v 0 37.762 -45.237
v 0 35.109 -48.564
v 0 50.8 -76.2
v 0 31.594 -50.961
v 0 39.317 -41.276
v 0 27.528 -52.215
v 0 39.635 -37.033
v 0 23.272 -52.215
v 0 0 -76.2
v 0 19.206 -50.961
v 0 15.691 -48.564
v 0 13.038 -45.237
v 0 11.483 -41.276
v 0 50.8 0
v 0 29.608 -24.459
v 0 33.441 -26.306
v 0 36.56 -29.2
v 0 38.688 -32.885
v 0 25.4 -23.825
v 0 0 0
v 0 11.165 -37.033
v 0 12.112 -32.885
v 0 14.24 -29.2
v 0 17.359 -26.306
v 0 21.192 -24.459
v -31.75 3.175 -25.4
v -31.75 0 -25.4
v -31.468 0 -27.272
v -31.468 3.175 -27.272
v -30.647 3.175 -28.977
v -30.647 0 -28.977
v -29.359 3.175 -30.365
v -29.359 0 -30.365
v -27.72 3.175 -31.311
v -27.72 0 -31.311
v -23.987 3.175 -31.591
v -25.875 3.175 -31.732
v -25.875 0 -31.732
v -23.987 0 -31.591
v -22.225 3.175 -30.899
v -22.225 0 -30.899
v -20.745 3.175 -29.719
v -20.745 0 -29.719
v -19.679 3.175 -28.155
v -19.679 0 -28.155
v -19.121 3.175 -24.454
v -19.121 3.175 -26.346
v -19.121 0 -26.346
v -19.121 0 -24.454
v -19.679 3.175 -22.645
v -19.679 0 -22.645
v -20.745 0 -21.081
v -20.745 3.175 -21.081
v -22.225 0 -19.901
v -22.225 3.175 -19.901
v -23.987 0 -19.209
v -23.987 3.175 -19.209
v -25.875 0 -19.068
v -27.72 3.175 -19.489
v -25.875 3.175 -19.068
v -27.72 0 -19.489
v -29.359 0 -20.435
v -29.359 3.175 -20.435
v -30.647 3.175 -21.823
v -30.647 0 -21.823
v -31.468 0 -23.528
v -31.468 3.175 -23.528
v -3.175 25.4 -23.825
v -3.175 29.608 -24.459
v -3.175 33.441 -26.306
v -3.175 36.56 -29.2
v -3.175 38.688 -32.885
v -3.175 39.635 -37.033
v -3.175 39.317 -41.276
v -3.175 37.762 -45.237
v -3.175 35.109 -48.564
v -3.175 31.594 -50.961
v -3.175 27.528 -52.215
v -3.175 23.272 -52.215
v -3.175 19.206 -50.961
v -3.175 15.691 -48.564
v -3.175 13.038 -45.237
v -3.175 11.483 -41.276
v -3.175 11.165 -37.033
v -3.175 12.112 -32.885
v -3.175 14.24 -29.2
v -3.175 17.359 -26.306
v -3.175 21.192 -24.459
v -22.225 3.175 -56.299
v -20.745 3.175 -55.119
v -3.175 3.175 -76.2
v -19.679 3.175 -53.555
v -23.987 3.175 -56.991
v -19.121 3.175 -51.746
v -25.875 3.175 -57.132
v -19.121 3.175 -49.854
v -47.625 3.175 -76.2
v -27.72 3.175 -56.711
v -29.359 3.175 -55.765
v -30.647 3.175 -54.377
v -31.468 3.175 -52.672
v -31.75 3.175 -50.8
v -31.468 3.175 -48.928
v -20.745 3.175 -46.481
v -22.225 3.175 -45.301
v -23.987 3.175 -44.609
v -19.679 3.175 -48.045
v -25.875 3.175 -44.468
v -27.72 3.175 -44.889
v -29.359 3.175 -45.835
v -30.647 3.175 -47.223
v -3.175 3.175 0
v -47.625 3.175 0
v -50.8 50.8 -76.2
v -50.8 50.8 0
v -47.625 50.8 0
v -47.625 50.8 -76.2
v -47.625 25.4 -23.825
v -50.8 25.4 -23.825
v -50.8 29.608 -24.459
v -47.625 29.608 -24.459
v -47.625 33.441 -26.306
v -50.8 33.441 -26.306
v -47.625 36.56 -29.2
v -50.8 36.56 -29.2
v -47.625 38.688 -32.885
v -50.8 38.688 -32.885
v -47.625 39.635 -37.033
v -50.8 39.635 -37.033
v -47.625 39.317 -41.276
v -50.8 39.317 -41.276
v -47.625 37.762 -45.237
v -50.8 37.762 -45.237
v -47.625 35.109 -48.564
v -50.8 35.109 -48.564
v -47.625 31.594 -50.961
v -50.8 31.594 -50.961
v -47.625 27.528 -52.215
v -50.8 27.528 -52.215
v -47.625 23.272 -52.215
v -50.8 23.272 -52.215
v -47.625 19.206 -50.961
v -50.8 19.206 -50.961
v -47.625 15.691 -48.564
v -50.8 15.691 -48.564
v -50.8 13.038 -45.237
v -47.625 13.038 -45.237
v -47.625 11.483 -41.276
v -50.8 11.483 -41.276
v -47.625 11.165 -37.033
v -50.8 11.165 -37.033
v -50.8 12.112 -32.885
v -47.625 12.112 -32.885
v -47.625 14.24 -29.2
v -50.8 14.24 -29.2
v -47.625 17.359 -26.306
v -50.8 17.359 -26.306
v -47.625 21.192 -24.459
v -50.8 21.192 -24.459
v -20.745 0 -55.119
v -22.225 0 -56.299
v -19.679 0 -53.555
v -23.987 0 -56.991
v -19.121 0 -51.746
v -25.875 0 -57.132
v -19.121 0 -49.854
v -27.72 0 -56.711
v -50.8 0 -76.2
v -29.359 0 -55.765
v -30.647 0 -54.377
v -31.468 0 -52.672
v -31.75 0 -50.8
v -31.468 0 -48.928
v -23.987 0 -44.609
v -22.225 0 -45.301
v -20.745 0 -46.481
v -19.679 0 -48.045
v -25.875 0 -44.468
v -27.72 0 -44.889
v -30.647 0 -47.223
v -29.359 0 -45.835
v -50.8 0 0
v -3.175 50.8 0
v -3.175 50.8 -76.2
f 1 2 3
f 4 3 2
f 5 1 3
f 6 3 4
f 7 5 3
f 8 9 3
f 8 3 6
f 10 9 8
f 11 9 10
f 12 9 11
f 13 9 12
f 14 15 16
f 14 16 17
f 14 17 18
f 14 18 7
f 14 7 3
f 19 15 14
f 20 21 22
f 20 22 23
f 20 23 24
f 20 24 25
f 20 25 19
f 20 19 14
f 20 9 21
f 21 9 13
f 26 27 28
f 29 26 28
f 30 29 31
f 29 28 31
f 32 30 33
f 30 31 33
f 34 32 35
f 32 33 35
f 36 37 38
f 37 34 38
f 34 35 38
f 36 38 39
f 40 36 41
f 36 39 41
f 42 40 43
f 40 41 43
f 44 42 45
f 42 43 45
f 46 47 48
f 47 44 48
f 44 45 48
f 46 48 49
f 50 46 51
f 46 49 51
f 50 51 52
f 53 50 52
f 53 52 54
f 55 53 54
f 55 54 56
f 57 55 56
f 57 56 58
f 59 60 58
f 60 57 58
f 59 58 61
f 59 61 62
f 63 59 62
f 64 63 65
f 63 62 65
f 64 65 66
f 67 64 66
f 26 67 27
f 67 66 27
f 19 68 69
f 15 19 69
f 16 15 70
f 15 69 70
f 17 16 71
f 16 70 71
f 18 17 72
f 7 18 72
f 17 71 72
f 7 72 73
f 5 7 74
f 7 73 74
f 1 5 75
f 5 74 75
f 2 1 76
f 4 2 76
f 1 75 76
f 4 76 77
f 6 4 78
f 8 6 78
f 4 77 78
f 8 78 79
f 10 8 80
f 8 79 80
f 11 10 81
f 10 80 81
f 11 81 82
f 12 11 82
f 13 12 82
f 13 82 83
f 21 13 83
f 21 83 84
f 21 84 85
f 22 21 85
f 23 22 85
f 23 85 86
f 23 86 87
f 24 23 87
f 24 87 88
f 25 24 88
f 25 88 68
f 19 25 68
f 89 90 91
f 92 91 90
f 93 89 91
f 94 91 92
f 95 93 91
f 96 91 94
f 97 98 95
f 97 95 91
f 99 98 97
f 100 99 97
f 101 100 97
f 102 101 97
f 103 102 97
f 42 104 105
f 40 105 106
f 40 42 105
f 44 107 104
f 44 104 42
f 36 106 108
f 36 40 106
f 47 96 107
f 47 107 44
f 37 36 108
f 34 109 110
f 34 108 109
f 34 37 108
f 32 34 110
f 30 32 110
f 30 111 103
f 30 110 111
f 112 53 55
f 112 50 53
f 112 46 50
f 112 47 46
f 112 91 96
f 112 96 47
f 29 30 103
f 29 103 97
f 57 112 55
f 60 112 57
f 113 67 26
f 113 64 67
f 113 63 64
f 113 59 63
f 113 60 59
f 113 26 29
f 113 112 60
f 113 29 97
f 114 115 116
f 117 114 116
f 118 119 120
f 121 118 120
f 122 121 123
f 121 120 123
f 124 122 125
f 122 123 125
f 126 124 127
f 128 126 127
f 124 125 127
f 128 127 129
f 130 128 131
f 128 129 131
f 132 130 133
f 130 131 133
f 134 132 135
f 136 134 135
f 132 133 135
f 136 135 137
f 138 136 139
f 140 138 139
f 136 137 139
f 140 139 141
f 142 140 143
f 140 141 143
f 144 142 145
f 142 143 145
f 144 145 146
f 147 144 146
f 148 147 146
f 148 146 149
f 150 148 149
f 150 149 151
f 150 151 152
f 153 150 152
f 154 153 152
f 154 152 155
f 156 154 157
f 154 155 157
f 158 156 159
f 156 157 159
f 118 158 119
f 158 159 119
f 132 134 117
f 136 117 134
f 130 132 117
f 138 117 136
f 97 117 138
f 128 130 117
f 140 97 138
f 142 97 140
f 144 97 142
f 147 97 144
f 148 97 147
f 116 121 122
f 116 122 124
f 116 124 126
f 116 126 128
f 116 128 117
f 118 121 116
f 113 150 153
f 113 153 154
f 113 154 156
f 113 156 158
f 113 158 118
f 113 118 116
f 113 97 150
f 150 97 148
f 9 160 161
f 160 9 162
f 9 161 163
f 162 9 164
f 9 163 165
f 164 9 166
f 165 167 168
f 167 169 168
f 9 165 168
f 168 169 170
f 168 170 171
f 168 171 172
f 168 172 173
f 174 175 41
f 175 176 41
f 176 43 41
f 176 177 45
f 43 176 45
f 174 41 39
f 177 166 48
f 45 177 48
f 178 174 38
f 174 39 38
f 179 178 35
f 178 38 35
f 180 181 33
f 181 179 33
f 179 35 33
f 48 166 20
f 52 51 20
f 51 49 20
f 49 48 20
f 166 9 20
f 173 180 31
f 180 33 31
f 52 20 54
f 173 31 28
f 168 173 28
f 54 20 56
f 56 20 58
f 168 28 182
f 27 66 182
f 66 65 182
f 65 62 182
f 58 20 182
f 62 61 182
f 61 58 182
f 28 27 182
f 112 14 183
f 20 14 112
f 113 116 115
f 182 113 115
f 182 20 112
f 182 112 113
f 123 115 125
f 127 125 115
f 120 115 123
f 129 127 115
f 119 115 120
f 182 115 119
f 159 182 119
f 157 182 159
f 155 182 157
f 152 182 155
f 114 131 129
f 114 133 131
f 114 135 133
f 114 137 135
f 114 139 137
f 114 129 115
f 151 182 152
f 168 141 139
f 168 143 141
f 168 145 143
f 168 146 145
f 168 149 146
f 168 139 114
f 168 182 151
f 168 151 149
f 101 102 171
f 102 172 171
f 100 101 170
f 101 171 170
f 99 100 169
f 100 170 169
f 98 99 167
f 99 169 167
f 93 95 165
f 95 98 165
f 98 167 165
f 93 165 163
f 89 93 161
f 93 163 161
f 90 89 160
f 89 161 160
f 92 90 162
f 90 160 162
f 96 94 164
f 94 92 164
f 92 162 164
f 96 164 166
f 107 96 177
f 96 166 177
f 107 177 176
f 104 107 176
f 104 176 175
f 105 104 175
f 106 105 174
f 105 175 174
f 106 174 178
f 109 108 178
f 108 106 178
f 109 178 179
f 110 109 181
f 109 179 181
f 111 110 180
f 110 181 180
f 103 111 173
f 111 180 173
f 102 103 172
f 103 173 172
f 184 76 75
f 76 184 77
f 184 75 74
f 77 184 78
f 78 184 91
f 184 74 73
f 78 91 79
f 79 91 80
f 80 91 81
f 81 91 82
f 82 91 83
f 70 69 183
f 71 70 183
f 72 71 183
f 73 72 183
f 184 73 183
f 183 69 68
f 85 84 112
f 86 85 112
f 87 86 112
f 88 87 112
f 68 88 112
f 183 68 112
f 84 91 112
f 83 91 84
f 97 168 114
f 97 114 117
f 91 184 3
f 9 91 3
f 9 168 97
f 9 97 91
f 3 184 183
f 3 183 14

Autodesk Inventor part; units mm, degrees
ref_plane "YZ Plane" through (0, 0, 0) normal (1, 0, 0) x (0, 1, 0)
ref_plane "XZ Plane" through (0, 0, 0) normal (0, 1, 0) x (-1, 0, 0)
ref_plane "XY Plane" through (0, 0, 0) normal (0, 0, 1) x (1, 0, 0)
sketch "Sketch1" plane through (0, 0, 0) normal (0, 1, 0) x (-1, 0, 0)
  line L0 (0, 0) -> (50.8, 0)
  line L1 (50.8, 0) -> (50.8, -76.2)
  line L2 (50.8, -76.2) -> (0, -76.2)
  line L3 (0, -76.2) -> (0, 0)
  circle A0 centre (25.4, -50.8) radius 6.35
  circle A1 centre (25.4, -25.4) radius 6.35
  dimension "d0" = 50.8
  dimension "d1" = 76.2
  dimension "d13" = 25.4
  dimension "d14" = 25.4
  dimension "d15" = 25.4
  dimension "d16" = 25.4
  dimension "d17" = 12.7
  dimension "d18" = 12.7
extrude "Extrusion3" add sketch "Sketch1" along normal blind 3.175
sketch "Sketch5" plane through (0, 3.175, 0) normal (0, 1, 0) x (1, 0, 0)
  line L0 (0, 76.2) -> (-50.8, 76.2) projected
  line L1 (-50.8, 76.2) -> (-47.625, 76.2)
  line L2 (-47.625, 76.2) -> (-47.625, 0)
  line L3 (-47.625, 0) -> (-50.8, 0)
  line L4 (-50.8, 0) -> (-50.8, 76.2)
  line L5 (0, 76.2) -> (-3.175, 76.2)
  line L6 (-3.175, 76.2) -> (-3.175, 0)
  line L7 (-3.175, 0) -> (0, 0)
  line L8 (0, 0) -> (0, 76.2)
  point P0 (0, 0)
  dimension "d21" = 3.175
  dimension "d22" = 3.175
  dimension "d23" = 76.2
  dimension "d24" = 76.2
extrude "Extrusion4" add sketch "Sketch5" along normal blind 47.625
sketch "Sketch6" plane through (-50.8, 0, -76.2) normal (-1, 0, 0) x (0, 0, 1)
  circle A0 centre (38.1, 25.4) radius 14.2748
  line L0 (76.2, 0) -> (76.2, 50.8) projected
  line L1 (76.2, 0) -> (0, 0) projected
  dimension "d27" = 28.5496
  dimension "d28" = 38.1
  dimension "d29" = 25.4
extrude "Extrusion6" cut sketch "Sketch6" against normal blind 50.8
equation "\"d24\" = d23"
properties part number "Scaling Arms Mounting Bracket"
